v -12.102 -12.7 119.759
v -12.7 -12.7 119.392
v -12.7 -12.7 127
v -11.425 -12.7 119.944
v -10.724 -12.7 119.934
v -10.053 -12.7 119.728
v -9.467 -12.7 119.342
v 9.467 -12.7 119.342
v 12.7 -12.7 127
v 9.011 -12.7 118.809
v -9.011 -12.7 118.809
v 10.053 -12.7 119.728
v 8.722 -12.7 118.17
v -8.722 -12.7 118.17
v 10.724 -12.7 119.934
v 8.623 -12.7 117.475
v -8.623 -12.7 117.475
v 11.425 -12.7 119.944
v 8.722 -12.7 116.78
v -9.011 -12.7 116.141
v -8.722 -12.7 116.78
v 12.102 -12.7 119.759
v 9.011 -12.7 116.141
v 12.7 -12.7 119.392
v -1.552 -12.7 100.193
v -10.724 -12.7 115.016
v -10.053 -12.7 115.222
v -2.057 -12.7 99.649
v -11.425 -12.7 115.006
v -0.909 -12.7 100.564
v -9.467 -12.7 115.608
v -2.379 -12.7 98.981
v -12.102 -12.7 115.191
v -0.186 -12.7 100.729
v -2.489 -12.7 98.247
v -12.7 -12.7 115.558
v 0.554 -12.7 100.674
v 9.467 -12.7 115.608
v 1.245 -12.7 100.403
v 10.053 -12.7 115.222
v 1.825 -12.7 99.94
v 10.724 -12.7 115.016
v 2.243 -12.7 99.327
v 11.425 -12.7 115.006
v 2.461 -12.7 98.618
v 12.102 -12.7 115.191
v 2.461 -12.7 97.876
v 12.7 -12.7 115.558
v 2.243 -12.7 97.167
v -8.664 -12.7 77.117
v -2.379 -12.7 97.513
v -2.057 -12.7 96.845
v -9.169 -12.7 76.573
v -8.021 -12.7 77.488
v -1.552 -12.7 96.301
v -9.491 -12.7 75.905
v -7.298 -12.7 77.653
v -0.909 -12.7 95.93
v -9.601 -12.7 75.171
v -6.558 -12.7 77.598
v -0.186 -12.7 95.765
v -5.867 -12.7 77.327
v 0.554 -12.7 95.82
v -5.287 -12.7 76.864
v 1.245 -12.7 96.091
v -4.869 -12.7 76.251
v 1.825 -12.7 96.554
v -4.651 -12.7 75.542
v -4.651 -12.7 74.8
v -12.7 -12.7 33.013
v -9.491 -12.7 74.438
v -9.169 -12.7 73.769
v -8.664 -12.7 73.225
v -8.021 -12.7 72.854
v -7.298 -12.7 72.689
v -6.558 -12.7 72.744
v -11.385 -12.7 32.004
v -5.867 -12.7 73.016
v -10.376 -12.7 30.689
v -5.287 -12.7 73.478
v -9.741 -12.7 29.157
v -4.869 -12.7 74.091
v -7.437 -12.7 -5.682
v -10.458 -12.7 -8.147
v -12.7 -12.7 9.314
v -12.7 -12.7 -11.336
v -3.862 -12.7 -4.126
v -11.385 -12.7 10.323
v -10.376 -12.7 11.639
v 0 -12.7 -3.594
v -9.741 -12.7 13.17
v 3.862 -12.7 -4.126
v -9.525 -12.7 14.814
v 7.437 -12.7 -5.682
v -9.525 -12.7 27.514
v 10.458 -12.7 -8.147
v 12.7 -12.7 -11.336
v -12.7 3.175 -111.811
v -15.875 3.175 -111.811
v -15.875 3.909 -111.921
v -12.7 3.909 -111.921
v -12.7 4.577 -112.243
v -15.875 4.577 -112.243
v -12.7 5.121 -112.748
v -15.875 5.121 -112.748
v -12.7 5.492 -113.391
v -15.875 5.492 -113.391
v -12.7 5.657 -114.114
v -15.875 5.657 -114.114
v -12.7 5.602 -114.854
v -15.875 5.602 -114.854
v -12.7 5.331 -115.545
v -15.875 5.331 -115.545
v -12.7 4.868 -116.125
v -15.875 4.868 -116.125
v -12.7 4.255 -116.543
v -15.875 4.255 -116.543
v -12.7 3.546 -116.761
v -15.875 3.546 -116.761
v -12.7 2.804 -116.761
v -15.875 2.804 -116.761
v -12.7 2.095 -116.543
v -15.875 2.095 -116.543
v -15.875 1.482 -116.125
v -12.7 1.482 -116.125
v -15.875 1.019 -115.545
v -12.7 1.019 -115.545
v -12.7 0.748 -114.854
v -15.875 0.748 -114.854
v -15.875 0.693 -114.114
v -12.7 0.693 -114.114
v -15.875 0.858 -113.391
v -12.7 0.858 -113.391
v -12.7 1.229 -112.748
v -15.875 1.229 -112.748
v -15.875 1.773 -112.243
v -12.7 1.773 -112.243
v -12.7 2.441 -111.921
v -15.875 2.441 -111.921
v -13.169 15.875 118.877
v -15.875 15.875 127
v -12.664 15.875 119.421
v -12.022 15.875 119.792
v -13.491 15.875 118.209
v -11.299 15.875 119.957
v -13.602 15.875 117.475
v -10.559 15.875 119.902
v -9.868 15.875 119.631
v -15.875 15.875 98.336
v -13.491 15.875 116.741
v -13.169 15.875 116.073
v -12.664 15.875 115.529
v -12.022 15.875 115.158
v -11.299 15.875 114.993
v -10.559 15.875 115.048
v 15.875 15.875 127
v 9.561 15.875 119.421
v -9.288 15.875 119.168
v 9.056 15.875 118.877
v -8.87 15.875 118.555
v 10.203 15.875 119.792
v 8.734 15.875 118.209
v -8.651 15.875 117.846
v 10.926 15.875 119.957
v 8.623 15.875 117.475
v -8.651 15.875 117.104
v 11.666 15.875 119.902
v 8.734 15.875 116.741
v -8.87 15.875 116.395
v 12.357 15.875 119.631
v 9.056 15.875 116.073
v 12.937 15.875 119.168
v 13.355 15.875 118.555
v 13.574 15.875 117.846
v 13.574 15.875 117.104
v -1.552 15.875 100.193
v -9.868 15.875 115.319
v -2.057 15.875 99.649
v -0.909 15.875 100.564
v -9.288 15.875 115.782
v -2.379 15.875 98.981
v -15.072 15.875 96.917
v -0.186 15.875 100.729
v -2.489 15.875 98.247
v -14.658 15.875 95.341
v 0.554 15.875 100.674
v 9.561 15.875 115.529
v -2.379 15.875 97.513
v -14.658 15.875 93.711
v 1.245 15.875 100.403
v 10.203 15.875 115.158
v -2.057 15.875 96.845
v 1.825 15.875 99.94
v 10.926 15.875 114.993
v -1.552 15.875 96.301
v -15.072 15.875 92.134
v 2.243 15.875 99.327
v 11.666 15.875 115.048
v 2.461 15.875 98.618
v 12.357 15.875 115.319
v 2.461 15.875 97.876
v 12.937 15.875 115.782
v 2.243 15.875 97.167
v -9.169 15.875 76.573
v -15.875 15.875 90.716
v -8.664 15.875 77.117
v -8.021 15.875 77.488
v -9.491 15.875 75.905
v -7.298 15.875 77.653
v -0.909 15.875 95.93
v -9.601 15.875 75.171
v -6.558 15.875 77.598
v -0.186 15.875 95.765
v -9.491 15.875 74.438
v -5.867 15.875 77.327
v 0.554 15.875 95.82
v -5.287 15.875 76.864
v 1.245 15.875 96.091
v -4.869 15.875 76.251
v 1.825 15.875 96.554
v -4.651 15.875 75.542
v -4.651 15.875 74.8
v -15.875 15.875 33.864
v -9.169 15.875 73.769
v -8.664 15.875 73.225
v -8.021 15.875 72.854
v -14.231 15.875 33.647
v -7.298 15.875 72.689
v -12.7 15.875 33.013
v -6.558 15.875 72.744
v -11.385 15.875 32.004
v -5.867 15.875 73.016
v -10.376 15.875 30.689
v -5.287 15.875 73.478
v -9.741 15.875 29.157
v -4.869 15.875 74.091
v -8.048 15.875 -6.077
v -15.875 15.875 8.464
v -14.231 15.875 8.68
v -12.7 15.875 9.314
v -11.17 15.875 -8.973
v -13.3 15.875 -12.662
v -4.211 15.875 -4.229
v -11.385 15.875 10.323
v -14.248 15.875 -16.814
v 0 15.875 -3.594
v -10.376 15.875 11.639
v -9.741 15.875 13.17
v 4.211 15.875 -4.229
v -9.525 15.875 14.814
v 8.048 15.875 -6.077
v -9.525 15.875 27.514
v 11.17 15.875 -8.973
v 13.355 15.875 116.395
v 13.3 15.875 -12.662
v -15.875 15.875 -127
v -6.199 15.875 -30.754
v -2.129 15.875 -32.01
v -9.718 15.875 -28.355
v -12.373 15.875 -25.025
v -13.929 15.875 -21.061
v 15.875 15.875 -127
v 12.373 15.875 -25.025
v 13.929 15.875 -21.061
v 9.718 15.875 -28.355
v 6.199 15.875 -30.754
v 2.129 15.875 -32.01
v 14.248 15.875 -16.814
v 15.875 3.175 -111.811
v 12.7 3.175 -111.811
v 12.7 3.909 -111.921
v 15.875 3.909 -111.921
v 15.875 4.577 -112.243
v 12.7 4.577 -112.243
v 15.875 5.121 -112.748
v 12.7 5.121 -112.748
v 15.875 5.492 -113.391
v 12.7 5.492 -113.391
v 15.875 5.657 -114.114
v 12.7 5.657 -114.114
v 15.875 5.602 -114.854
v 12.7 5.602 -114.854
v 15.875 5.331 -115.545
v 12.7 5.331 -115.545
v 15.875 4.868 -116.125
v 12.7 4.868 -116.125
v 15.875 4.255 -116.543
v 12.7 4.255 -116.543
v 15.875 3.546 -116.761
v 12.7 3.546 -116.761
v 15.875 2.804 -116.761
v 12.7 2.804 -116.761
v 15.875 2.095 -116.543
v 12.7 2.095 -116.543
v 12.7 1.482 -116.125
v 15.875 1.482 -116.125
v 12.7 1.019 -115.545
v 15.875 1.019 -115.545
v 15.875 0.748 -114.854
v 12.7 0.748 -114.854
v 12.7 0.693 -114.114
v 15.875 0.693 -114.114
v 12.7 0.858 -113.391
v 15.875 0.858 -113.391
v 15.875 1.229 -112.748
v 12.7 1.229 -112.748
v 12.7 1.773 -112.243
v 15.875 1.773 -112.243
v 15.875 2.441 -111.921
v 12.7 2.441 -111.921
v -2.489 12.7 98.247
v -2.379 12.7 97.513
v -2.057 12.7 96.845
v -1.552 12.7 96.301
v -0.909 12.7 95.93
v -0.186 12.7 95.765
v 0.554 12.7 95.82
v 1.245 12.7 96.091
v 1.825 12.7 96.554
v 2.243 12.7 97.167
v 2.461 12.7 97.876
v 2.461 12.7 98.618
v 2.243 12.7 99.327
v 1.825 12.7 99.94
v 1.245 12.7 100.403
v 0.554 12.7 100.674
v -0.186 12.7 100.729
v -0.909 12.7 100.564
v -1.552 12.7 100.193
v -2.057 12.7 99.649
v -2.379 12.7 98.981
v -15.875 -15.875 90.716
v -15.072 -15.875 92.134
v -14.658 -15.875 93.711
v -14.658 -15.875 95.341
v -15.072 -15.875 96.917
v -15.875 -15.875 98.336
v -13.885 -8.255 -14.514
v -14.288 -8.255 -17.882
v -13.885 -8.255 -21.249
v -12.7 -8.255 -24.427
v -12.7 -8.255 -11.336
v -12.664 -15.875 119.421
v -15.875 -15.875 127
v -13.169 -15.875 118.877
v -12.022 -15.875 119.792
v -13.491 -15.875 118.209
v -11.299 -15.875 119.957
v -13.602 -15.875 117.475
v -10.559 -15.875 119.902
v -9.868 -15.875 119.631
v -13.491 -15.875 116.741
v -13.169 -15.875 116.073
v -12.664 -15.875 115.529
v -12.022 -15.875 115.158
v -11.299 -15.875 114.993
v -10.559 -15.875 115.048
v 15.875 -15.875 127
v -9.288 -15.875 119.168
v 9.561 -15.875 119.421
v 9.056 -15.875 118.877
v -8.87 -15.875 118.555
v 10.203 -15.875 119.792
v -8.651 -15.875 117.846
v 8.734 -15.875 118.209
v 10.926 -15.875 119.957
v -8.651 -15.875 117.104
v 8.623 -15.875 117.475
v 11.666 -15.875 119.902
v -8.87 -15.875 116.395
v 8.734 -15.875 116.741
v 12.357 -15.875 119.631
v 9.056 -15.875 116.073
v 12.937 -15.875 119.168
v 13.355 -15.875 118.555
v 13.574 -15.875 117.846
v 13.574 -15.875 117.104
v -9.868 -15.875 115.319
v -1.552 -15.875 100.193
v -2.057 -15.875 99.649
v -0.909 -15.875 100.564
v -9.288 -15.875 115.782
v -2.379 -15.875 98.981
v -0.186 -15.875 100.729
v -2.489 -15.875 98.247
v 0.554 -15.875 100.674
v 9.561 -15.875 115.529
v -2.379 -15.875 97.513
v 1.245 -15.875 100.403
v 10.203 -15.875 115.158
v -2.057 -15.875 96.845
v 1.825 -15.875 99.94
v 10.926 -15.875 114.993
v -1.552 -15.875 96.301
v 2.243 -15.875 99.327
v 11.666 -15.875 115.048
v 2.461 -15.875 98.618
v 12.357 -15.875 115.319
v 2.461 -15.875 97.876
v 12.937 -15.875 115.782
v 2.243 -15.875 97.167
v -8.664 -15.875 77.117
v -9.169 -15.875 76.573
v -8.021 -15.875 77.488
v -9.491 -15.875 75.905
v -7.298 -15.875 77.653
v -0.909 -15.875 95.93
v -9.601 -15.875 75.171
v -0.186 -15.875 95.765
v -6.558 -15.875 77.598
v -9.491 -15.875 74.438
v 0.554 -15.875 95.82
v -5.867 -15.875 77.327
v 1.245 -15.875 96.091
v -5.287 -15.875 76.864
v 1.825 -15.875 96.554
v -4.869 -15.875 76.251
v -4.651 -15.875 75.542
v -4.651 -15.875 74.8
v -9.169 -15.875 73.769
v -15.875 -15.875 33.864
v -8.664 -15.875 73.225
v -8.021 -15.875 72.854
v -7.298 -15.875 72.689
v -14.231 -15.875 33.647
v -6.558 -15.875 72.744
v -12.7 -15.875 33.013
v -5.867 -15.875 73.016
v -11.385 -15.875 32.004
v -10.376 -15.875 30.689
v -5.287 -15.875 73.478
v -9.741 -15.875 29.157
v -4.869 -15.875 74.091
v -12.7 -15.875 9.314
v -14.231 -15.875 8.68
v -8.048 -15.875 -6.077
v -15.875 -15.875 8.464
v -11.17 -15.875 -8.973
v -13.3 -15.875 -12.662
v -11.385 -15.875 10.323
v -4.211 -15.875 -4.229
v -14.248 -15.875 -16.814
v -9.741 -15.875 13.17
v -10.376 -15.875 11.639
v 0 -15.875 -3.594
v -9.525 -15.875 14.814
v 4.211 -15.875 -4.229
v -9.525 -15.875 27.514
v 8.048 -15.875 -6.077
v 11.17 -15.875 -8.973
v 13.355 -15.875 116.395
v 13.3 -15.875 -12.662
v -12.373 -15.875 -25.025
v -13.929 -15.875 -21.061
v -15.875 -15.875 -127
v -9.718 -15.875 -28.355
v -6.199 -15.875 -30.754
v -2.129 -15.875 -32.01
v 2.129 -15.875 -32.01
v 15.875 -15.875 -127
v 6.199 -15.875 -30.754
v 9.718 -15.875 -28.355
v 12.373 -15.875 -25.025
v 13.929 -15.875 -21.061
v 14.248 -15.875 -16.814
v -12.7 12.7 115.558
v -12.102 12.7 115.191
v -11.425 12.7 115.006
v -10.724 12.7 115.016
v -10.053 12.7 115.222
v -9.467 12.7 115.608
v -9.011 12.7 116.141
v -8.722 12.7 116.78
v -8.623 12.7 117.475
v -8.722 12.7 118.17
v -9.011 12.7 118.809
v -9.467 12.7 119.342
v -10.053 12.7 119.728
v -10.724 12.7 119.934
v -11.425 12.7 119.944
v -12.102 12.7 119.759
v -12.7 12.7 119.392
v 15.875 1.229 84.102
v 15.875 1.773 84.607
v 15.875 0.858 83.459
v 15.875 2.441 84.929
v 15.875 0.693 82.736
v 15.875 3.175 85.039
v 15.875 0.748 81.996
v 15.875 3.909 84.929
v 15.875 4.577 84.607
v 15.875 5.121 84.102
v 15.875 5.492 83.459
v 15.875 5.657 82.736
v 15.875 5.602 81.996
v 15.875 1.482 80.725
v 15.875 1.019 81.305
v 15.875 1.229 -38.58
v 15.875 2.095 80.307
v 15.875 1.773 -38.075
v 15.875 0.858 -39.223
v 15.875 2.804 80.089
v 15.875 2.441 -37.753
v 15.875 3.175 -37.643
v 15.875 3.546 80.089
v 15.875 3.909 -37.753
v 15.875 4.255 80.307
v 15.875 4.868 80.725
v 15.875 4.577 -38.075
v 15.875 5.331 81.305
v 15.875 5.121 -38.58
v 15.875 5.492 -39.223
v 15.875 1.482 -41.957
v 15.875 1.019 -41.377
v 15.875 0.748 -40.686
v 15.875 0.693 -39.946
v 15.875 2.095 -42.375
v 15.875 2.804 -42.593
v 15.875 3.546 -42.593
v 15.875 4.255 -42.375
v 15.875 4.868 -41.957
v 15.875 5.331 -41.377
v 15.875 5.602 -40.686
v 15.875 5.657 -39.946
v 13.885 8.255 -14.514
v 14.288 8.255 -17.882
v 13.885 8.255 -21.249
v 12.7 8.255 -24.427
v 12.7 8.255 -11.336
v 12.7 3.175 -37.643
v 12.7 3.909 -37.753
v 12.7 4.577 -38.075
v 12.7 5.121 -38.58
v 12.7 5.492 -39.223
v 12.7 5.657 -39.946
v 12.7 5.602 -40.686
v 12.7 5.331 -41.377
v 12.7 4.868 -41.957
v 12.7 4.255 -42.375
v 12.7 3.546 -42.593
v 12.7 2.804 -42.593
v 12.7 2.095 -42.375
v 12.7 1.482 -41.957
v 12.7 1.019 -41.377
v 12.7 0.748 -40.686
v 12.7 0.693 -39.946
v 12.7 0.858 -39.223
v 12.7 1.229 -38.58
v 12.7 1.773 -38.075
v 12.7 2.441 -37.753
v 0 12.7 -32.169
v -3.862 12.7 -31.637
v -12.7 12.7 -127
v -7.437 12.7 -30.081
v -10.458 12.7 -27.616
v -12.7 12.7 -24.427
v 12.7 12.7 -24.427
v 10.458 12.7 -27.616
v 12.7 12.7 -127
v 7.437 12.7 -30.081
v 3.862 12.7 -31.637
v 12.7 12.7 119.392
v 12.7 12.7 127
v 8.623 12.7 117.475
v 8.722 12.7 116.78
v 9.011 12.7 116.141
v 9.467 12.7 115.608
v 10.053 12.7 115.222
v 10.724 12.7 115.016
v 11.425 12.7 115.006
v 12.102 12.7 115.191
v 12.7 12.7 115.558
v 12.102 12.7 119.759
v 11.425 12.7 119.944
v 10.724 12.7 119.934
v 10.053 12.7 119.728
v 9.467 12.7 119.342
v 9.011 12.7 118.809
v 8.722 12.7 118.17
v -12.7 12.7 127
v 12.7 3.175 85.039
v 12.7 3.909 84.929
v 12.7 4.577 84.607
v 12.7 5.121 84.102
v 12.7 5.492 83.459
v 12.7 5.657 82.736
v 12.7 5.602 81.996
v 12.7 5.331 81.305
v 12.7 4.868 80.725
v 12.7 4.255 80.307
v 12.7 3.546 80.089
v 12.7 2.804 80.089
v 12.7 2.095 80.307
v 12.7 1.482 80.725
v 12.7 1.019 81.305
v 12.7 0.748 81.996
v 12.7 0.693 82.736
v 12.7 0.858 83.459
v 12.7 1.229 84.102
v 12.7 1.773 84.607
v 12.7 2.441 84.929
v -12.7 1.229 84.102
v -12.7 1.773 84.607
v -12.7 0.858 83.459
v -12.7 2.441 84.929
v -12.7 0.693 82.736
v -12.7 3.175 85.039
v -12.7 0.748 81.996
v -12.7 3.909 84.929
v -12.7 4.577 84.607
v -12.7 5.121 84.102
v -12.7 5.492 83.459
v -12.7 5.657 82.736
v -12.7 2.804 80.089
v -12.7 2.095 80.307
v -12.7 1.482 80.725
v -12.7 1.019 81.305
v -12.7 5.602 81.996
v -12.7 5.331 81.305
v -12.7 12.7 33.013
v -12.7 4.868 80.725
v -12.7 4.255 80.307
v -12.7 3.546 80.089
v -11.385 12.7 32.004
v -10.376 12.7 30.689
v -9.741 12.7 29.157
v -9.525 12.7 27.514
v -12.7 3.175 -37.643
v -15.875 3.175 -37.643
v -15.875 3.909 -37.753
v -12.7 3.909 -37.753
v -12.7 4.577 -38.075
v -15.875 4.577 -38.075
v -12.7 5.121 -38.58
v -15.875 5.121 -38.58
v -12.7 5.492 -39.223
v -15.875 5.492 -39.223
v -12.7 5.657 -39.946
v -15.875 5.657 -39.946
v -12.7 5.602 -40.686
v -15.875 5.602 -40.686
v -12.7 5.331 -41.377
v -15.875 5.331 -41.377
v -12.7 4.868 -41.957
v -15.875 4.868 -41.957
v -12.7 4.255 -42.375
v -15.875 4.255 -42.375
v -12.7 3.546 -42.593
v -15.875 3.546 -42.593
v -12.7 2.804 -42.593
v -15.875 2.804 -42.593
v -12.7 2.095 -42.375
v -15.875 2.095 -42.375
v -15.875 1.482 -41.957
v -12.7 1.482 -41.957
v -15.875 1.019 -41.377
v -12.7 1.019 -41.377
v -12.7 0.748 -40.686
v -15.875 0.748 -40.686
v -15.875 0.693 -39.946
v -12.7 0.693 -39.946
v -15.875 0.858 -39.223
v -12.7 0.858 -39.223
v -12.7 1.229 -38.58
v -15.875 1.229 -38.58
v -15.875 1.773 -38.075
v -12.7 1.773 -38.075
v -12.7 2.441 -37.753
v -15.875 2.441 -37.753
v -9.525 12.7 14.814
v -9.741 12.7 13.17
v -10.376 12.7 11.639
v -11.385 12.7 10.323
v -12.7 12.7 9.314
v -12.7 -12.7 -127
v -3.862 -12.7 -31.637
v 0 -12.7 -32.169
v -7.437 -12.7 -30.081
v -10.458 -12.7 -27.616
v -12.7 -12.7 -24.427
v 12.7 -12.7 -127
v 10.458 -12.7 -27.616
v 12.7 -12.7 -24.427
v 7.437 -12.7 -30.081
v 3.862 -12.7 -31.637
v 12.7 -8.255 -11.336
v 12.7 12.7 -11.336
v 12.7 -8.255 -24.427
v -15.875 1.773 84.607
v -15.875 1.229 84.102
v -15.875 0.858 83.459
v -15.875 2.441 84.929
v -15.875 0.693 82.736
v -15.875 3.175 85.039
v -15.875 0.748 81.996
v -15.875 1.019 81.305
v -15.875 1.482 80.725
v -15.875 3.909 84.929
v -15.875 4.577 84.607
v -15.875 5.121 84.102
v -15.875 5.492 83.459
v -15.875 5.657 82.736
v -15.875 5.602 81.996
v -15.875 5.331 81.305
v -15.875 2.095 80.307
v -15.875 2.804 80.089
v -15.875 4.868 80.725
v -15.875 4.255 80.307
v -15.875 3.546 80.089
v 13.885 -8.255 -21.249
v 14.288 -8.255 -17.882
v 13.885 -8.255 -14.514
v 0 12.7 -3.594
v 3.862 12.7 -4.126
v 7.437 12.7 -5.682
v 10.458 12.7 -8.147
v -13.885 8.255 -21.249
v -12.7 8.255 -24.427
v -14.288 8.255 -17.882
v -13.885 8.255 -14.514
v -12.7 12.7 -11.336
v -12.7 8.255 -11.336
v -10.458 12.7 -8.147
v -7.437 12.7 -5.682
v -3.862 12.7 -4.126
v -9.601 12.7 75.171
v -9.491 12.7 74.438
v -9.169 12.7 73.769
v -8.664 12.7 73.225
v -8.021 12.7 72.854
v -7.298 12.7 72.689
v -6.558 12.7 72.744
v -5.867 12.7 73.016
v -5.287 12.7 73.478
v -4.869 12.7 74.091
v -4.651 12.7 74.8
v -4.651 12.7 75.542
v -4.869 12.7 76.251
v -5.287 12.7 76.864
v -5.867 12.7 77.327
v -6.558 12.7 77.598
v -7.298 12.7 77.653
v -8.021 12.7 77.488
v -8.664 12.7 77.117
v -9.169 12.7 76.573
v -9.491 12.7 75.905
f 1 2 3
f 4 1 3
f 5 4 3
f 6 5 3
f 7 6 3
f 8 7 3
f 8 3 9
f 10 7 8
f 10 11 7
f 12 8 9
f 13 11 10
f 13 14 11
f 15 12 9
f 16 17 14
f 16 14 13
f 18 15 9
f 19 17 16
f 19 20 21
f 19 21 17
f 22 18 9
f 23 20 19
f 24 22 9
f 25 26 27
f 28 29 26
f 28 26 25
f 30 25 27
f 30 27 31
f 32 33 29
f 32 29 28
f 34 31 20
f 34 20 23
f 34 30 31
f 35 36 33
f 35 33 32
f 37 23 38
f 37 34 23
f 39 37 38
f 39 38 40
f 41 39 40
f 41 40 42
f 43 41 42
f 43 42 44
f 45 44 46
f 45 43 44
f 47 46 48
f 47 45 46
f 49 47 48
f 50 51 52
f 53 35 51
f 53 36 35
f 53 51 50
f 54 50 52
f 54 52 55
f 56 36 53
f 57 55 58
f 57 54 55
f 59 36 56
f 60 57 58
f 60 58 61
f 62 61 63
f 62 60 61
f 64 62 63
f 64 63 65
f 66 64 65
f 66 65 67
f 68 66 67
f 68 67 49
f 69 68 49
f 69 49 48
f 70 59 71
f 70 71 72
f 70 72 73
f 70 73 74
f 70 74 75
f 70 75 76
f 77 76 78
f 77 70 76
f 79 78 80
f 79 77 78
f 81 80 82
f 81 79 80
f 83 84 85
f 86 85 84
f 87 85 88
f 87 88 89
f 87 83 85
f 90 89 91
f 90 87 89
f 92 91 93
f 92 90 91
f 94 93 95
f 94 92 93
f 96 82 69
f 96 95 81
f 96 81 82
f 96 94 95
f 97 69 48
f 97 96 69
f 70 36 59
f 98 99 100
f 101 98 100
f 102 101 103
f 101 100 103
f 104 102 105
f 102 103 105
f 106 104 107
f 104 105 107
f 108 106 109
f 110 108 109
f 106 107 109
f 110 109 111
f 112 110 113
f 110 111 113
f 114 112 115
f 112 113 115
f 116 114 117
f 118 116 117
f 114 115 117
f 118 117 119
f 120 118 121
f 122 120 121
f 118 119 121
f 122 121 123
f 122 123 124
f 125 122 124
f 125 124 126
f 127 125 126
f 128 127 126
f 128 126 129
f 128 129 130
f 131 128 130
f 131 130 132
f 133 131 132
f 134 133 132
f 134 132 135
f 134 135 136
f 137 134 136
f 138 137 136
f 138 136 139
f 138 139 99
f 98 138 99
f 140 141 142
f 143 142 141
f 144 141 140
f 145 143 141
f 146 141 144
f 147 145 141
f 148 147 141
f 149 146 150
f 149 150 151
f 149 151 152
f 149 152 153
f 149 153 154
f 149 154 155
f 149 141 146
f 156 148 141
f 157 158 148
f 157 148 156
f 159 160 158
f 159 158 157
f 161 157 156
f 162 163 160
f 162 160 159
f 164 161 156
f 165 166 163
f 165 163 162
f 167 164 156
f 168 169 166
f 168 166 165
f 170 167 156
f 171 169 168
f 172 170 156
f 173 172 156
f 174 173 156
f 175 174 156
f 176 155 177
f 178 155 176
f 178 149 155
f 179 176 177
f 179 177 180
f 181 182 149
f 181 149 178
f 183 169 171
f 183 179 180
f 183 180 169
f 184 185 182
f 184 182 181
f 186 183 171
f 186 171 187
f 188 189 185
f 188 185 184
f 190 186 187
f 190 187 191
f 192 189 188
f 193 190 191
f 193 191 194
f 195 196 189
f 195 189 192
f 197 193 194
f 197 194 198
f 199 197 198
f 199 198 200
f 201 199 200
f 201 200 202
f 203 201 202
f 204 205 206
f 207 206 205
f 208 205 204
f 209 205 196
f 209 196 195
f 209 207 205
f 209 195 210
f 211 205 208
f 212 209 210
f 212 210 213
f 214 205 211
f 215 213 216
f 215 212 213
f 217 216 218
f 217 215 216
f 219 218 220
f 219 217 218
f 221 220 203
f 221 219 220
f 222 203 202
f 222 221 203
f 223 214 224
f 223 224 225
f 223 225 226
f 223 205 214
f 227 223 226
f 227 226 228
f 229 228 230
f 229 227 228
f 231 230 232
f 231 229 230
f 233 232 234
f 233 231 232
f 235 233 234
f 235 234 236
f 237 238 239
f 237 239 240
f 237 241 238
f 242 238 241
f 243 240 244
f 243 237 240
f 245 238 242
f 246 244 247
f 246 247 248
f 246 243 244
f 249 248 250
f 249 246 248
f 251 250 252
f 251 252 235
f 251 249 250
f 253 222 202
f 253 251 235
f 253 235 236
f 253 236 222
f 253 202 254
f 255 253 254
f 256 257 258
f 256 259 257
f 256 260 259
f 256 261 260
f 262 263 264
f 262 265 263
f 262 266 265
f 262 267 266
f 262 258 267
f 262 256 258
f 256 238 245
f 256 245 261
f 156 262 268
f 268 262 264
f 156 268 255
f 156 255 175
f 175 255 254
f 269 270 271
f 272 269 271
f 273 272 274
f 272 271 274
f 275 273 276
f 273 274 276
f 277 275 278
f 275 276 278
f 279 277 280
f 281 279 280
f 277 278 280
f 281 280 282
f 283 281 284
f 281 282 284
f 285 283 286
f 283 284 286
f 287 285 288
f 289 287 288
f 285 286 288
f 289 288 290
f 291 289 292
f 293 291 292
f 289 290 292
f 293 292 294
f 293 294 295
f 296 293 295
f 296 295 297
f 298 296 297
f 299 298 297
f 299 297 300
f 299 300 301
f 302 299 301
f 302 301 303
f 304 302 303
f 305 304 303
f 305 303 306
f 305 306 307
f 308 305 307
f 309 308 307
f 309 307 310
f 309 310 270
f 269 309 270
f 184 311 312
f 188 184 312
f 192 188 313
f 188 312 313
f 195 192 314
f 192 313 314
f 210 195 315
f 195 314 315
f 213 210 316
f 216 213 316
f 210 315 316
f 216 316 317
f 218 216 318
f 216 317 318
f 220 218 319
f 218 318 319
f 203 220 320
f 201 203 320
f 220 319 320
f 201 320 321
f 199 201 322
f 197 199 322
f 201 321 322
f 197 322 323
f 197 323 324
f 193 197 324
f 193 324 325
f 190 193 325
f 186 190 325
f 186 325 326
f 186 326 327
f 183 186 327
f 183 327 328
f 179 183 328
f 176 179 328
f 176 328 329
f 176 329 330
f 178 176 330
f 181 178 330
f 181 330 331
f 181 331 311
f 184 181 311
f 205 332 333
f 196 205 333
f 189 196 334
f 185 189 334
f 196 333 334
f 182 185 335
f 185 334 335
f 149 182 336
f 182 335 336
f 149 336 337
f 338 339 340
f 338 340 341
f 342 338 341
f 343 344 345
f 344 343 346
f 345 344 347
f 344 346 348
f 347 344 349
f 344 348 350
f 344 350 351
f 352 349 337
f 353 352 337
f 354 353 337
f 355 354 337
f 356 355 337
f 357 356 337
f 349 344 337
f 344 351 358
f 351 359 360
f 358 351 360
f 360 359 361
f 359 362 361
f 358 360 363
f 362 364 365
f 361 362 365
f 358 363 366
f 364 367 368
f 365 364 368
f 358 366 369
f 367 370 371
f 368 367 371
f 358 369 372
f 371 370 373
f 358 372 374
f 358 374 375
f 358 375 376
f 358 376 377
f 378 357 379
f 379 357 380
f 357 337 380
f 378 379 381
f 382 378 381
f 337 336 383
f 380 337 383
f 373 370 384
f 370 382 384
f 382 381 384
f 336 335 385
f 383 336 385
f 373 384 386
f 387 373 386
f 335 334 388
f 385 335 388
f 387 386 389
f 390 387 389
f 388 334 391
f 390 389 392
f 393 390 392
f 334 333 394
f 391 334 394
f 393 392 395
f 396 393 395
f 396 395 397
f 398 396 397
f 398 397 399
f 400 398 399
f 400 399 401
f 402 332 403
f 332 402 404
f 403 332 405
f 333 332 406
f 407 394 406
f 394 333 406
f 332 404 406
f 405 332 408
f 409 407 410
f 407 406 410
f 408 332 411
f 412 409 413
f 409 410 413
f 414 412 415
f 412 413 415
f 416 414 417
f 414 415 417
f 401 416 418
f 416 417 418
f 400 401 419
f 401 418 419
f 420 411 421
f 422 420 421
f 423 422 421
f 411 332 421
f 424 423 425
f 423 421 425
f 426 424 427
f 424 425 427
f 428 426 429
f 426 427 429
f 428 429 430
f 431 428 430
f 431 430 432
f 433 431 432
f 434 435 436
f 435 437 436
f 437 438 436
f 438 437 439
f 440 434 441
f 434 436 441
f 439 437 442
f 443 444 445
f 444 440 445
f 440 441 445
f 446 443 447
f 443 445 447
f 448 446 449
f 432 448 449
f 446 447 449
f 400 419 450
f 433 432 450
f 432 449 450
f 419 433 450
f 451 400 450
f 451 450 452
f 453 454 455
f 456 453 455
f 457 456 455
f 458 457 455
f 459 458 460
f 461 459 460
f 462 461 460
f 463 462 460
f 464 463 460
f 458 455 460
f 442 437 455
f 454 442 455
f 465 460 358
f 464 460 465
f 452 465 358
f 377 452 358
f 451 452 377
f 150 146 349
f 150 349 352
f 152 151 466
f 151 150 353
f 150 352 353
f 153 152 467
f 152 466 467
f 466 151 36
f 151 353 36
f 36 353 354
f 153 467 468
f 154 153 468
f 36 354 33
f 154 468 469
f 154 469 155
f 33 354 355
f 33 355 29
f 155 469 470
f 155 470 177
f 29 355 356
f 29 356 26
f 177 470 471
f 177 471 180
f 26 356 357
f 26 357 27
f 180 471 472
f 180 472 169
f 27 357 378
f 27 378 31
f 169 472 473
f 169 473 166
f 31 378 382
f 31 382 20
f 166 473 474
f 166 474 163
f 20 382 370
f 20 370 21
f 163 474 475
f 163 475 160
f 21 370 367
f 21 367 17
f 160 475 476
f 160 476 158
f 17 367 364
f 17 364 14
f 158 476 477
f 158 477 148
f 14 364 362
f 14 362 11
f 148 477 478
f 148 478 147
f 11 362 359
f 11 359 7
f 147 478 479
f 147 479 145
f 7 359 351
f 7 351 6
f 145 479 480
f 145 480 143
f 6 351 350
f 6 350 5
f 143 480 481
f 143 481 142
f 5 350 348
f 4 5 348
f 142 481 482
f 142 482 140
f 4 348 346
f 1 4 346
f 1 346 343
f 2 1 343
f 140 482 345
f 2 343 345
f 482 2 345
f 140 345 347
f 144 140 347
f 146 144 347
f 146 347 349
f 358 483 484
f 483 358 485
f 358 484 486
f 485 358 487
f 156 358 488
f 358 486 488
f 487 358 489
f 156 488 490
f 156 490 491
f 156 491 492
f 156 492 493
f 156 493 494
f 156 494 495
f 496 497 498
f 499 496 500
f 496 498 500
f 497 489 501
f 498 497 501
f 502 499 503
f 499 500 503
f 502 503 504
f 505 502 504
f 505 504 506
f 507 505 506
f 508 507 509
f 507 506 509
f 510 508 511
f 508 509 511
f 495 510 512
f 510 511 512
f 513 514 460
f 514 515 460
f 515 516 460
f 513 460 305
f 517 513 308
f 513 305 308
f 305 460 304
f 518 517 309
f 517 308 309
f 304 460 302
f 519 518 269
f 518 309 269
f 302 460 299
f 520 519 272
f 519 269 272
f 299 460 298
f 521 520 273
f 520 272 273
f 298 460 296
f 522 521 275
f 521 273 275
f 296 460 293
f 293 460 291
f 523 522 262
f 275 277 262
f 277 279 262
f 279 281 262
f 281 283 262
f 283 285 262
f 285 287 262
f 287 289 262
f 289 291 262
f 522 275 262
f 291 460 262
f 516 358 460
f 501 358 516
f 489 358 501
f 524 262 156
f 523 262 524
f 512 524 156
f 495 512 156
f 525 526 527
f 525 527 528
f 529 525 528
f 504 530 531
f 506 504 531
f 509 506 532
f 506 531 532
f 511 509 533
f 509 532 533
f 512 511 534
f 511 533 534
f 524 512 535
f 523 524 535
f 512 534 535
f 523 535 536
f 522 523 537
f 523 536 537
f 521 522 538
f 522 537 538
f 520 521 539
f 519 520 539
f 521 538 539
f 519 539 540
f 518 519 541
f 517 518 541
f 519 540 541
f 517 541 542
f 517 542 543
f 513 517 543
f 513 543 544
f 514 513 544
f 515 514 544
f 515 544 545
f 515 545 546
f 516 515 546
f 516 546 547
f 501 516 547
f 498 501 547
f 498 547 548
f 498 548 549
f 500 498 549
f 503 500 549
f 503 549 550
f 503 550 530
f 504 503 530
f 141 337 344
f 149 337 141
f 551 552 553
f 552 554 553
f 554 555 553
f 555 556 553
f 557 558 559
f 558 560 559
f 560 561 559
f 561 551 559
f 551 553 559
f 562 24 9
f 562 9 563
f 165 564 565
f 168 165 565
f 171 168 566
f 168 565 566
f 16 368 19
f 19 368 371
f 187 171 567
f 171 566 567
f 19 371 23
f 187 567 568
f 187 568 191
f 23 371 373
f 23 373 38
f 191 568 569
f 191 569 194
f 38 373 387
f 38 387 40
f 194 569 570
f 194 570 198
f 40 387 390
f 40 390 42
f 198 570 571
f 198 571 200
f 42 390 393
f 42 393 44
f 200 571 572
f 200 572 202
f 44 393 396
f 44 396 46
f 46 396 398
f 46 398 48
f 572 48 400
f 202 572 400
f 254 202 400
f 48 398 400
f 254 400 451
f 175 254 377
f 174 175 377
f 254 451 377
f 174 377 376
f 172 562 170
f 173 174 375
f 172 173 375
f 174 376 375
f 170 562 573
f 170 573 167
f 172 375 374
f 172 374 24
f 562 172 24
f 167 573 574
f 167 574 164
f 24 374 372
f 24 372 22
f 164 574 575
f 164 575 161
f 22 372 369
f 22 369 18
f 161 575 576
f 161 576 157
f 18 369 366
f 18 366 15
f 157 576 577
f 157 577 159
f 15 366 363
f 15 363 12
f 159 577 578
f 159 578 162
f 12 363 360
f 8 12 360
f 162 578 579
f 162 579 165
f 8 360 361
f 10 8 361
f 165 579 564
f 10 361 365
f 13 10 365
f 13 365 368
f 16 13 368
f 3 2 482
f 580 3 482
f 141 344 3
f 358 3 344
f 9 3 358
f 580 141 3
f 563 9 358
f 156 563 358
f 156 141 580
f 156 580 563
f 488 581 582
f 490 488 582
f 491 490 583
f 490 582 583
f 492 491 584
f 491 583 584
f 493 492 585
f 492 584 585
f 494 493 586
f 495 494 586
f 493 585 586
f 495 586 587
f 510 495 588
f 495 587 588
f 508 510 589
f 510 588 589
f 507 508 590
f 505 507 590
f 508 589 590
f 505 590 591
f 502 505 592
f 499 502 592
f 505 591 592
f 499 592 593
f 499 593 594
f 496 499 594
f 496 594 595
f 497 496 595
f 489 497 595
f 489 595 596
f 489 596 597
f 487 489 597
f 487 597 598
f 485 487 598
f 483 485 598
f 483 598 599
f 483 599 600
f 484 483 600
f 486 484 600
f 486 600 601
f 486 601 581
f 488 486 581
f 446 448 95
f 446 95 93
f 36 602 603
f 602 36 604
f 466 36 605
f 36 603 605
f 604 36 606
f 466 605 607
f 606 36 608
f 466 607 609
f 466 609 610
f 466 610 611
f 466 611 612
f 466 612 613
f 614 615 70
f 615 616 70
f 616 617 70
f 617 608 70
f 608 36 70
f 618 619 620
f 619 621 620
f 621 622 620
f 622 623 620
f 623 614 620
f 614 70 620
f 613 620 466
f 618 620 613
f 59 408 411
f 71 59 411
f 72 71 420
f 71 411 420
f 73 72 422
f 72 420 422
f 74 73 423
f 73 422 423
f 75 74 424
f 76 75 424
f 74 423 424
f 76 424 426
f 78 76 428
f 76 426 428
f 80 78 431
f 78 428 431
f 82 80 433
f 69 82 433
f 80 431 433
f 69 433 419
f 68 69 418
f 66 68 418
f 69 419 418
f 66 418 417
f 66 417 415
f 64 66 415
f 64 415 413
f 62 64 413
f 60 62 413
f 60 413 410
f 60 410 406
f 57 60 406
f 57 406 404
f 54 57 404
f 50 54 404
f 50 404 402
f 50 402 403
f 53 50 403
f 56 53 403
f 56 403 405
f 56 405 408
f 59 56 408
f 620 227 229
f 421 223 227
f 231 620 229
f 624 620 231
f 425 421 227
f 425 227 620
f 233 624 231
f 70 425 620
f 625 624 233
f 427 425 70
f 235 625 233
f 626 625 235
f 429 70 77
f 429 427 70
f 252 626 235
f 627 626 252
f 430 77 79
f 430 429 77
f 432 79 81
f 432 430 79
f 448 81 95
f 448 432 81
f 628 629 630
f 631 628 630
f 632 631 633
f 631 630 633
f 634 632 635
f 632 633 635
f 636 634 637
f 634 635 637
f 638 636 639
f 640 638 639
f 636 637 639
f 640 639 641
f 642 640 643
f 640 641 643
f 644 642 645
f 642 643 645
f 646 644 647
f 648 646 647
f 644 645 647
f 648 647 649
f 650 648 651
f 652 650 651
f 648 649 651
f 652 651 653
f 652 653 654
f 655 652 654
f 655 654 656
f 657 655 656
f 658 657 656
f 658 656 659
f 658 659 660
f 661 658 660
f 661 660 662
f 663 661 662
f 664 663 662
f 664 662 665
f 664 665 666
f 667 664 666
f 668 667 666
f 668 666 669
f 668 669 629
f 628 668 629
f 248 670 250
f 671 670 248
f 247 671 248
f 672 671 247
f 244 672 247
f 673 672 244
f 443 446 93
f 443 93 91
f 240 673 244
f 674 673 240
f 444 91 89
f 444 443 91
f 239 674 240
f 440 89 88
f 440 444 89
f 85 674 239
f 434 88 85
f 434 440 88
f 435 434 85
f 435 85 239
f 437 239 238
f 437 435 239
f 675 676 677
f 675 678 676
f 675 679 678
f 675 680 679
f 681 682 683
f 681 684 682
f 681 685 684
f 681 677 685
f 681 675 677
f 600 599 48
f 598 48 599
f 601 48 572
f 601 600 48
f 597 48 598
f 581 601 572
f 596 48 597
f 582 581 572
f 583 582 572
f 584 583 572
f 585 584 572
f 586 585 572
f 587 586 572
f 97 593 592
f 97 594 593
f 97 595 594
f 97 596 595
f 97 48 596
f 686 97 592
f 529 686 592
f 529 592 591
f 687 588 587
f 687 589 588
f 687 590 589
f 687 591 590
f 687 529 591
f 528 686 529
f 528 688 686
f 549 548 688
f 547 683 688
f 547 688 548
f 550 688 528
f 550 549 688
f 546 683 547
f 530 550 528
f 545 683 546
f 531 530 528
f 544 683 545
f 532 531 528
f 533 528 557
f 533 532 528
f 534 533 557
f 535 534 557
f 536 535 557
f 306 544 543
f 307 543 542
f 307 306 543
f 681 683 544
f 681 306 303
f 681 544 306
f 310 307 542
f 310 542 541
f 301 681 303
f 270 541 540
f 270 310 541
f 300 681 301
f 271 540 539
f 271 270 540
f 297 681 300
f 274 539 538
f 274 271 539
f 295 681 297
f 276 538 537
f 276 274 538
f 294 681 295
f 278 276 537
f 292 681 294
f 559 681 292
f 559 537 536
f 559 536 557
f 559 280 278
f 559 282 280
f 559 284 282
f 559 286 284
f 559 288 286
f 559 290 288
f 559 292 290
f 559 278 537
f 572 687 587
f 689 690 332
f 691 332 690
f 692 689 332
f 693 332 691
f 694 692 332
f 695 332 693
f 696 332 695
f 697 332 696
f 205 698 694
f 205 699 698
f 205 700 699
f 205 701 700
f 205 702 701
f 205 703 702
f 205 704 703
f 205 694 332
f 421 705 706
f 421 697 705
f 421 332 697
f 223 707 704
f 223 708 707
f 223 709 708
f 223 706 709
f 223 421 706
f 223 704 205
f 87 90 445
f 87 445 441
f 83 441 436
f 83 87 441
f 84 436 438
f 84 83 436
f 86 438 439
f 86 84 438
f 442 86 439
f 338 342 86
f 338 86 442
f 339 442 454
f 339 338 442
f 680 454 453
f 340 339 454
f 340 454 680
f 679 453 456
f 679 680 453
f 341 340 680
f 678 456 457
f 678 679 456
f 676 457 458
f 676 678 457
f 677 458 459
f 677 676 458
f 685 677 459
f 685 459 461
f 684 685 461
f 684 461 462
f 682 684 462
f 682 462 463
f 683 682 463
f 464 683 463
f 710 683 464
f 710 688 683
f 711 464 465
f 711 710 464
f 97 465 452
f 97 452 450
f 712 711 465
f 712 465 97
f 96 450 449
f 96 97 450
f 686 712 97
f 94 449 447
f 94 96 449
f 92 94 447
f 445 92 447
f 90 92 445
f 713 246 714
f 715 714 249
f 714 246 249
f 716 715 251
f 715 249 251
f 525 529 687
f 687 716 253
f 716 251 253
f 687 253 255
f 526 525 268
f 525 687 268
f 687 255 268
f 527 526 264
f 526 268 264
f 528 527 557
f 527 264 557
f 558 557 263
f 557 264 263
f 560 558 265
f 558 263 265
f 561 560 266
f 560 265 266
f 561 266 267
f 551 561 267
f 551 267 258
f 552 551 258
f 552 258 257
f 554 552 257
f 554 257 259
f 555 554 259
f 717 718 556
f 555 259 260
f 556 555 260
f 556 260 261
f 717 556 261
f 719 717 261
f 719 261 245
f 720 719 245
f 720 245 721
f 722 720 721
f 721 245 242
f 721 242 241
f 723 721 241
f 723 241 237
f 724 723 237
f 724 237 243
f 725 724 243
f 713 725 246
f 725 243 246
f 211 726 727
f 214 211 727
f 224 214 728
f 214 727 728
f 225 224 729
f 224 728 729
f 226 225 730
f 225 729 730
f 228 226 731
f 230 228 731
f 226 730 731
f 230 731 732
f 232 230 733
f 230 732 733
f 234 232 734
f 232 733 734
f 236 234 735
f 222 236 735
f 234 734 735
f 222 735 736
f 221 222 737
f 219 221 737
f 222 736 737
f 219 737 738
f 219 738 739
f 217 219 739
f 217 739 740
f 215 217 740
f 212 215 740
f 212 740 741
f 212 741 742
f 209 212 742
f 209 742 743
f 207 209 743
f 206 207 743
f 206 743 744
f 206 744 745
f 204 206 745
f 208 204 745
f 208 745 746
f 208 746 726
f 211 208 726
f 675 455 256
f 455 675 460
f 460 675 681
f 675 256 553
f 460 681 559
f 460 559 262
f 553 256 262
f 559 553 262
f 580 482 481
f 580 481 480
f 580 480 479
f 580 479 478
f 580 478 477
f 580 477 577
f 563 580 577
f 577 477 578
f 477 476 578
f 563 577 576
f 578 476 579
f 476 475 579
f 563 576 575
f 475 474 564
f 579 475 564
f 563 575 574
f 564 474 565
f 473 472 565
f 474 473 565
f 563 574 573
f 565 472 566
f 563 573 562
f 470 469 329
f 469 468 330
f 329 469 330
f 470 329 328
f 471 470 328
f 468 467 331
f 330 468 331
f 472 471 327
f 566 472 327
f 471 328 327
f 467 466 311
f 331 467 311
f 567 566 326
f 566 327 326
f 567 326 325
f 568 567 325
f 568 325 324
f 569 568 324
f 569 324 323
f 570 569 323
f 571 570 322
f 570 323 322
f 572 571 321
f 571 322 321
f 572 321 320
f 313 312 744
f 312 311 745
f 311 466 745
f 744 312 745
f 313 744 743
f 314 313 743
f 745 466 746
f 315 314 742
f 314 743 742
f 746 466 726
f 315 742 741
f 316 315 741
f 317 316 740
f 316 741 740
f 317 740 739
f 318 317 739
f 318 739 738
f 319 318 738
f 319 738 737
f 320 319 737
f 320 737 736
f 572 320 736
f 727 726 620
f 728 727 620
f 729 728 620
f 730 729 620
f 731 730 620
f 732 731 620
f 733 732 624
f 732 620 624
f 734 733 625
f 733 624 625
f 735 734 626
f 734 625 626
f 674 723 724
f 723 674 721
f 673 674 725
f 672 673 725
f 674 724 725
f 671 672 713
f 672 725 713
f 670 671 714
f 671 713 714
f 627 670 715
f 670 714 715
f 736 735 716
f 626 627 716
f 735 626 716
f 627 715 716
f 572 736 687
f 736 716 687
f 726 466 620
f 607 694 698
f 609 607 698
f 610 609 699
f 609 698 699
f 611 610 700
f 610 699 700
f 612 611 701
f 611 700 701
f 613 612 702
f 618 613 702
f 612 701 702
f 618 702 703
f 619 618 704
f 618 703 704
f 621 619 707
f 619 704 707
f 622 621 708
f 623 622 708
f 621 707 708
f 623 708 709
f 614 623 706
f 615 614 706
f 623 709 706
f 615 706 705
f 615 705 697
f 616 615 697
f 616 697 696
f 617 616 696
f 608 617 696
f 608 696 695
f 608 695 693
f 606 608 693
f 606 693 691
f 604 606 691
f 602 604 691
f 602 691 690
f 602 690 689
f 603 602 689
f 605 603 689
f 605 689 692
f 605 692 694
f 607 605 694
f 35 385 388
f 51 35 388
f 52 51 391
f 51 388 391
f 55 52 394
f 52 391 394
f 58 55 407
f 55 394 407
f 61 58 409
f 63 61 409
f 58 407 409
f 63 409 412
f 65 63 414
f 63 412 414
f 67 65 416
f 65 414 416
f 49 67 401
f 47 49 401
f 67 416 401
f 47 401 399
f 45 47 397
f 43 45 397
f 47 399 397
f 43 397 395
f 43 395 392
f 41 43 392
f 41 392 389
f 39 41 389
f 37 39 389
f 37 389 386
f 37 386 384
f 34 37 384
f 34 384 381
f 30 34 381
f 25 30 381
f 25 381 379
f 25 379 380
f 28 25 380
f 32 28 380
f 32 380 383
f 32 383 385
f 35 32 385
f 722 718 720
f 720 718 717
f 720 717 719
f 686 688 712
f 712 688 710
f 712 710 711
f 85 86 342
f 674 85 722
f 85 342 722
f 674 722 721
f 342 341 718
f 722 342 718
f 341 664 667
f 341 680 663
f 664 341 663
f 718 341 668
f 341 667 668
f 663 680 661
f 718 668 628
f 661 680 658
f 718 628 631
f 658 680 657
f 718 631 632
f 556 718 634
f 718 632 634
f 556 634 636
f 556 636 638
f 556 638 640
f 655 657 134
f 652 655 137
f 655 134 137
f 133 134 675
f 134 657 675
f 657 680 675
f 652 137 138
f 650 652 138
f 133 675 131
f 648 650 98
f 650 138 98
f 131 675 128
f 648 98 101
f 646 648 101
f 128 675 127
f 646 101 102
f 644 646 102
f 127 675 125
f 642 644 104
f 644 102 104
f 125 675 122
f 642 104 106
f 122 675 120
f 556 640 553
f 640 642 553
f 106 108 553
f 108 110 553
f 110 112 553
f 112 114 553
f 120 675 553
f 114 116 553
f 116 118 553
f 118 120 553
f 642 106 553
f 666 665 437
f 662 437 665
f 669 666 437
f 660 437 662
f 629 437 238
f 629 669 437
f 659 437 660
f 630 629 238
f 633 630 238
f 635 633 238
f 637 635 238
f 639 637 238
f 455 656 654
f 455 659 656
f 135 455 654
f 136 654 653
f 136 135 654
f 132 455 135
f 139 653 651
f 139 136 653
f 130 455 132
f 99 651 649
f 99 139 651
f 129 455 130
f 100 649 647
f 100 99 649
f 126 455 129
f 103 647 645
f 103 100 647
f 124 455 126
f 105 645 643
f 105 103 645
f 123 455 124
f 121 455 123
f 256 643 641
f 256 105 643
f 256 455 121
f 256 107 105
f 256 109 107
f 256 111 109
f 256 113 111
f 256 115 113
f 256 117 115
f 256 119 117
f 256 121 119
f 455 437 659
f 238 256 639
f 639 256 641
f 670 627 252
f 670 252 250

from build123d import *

# Parameters (mm, degrees)
BOSS_EXTRUDE1_DEPTH      = 127
BOSS_EXTRUDE1_DEPTH_BACK = 127
SKETCH3_W                = 31.75
SKETCH3_H                = 31.75
SKETCH3_W_2              = 25.4
SKETCH3_H_2              = 25.4
F_10_CLEARANCE_HOLE1_D   = 4.9784
SKETCH7_R                = 14.2875
CUT_EXTRUDE1_DEPTH       = 7.62
CUT_EXTRUDE2_START       = -7.62
SKETCH8_R                = 14.2875
CUT_EXTRUDE2_DEPTH       = 7.62
CUT_EXTRUDE3_DEPTH       = 132.867653824
F_10_CLEARANCE_HOLE2_D   = 4.9784
SKETCH13_R               = 6.35
CUT_EXTRUDE4_DEPTH       = 132.867653824


with BuildPart() as part:
    # Sketch3 → Boss-Extrude1 (new, two sides: drawn at the far end of the back side and taken through both)
    with BuildSketch(Plane.XY.offset(-BOSS_EXTRUDE1_DEPTH_BACK)):
        Rectangle(SKETCH3_W, SKETCH3_H)
        Rectangle(SKETCH3_W_2, SKETCH3_H_2, mode=Mode.SUBTRACT)
    extrude(amount=BOSS_EXTRUDE1_DEPTH + BOSS_EXTRUDE1_DEPTH_BACK)

    # #10 Clearance Hole1 (through all)
    with Locations(Plane(origin=(0, 15.875, 0), x_dir=(1, 0, 0), z_dir=(0, 1, 0))):
        with Locations((-11.1125, -117.475), (11.1125, -117.475), (0, -98.247200001), (-7.111939052, -75.171256705)):
            Hole(F_10_CLEARANCE_HOLE1_D / 2)

    # Sketch7 → Cut-Extrude1 (cut)
    with BuildSketch(Plane(origin=(0, 15.875, 0), x_dir=(1, 0, 0), z_dir=(0, 1, 0))):
        with Locations(Location((0, 17.8816, 0), (0, 0, 270))):
            Circle(SKETCH7_R)
    extrude(amount=-CUT_EXTRUDE1_DEPTH, mode=Mode.SUBTRACT)

    # Sketch8 → Cut-Extrude2 (cut)
    with BuildSketch(Plane.XZ.offset(15.875).offset(CUT_EXTRUDE2_START)):
        with Locations(Location((0, -17.8816, 0), (0, 0, 90))):
            Circle(SKETCH8_R)
    extrude(amount=CUT_EXTRUDE2_DEPTH, mode=Mode.SUBTRACT)

    # Sketch9 → Cut-Extrude3 (cut, through all)
    with BuildSketch(Plane.XZ.offset(15.875)):
        with BuildLine():
            Line((-9.525, 27.51353779), (-9.525, 14.81353779))
            ThreePointArc((-9.525, 14.81353779), (-11.384871939, 10.323409729), (-15.875, 8.46353779))
            Line((-15.875, 8.46353779), (-15.875, 33.86353779))
            ThreePointArc((-15.875, 33.86353779), (-11.384871939, 32.00366585), (-9.525, 27.51353779))
        make_face()
    extrude(amount=-CUT_EXTRUDE3_DEPTH, mode=Mode.SUBTRACT)

    # #10 Clearance Hole2 (through all)
    with Locations(Plane(origin=(15.875, 0, 0), x_dir=(0, 0, -1), z_dir=(1, 0, 0))):
        with Locations((-82.55, 3.175), (114.3, 3.175), (40.132, 3.175)):
            Hole(F_10_CLEARANCE_HOLE2_D / 2)

    # Sketch13 → Cut-Extrude4 (cut, through all)
    with BuildSketch(Plane.XZ.offset(15.875)):
        with Locations((-20.955, 94.525686877)):
            Circle(SKETCH13_R)
    extrude(amount=-CUT_EXTRUDE4_DEPTH, mode=Mode.SUBTRACT)


solid = part.part
